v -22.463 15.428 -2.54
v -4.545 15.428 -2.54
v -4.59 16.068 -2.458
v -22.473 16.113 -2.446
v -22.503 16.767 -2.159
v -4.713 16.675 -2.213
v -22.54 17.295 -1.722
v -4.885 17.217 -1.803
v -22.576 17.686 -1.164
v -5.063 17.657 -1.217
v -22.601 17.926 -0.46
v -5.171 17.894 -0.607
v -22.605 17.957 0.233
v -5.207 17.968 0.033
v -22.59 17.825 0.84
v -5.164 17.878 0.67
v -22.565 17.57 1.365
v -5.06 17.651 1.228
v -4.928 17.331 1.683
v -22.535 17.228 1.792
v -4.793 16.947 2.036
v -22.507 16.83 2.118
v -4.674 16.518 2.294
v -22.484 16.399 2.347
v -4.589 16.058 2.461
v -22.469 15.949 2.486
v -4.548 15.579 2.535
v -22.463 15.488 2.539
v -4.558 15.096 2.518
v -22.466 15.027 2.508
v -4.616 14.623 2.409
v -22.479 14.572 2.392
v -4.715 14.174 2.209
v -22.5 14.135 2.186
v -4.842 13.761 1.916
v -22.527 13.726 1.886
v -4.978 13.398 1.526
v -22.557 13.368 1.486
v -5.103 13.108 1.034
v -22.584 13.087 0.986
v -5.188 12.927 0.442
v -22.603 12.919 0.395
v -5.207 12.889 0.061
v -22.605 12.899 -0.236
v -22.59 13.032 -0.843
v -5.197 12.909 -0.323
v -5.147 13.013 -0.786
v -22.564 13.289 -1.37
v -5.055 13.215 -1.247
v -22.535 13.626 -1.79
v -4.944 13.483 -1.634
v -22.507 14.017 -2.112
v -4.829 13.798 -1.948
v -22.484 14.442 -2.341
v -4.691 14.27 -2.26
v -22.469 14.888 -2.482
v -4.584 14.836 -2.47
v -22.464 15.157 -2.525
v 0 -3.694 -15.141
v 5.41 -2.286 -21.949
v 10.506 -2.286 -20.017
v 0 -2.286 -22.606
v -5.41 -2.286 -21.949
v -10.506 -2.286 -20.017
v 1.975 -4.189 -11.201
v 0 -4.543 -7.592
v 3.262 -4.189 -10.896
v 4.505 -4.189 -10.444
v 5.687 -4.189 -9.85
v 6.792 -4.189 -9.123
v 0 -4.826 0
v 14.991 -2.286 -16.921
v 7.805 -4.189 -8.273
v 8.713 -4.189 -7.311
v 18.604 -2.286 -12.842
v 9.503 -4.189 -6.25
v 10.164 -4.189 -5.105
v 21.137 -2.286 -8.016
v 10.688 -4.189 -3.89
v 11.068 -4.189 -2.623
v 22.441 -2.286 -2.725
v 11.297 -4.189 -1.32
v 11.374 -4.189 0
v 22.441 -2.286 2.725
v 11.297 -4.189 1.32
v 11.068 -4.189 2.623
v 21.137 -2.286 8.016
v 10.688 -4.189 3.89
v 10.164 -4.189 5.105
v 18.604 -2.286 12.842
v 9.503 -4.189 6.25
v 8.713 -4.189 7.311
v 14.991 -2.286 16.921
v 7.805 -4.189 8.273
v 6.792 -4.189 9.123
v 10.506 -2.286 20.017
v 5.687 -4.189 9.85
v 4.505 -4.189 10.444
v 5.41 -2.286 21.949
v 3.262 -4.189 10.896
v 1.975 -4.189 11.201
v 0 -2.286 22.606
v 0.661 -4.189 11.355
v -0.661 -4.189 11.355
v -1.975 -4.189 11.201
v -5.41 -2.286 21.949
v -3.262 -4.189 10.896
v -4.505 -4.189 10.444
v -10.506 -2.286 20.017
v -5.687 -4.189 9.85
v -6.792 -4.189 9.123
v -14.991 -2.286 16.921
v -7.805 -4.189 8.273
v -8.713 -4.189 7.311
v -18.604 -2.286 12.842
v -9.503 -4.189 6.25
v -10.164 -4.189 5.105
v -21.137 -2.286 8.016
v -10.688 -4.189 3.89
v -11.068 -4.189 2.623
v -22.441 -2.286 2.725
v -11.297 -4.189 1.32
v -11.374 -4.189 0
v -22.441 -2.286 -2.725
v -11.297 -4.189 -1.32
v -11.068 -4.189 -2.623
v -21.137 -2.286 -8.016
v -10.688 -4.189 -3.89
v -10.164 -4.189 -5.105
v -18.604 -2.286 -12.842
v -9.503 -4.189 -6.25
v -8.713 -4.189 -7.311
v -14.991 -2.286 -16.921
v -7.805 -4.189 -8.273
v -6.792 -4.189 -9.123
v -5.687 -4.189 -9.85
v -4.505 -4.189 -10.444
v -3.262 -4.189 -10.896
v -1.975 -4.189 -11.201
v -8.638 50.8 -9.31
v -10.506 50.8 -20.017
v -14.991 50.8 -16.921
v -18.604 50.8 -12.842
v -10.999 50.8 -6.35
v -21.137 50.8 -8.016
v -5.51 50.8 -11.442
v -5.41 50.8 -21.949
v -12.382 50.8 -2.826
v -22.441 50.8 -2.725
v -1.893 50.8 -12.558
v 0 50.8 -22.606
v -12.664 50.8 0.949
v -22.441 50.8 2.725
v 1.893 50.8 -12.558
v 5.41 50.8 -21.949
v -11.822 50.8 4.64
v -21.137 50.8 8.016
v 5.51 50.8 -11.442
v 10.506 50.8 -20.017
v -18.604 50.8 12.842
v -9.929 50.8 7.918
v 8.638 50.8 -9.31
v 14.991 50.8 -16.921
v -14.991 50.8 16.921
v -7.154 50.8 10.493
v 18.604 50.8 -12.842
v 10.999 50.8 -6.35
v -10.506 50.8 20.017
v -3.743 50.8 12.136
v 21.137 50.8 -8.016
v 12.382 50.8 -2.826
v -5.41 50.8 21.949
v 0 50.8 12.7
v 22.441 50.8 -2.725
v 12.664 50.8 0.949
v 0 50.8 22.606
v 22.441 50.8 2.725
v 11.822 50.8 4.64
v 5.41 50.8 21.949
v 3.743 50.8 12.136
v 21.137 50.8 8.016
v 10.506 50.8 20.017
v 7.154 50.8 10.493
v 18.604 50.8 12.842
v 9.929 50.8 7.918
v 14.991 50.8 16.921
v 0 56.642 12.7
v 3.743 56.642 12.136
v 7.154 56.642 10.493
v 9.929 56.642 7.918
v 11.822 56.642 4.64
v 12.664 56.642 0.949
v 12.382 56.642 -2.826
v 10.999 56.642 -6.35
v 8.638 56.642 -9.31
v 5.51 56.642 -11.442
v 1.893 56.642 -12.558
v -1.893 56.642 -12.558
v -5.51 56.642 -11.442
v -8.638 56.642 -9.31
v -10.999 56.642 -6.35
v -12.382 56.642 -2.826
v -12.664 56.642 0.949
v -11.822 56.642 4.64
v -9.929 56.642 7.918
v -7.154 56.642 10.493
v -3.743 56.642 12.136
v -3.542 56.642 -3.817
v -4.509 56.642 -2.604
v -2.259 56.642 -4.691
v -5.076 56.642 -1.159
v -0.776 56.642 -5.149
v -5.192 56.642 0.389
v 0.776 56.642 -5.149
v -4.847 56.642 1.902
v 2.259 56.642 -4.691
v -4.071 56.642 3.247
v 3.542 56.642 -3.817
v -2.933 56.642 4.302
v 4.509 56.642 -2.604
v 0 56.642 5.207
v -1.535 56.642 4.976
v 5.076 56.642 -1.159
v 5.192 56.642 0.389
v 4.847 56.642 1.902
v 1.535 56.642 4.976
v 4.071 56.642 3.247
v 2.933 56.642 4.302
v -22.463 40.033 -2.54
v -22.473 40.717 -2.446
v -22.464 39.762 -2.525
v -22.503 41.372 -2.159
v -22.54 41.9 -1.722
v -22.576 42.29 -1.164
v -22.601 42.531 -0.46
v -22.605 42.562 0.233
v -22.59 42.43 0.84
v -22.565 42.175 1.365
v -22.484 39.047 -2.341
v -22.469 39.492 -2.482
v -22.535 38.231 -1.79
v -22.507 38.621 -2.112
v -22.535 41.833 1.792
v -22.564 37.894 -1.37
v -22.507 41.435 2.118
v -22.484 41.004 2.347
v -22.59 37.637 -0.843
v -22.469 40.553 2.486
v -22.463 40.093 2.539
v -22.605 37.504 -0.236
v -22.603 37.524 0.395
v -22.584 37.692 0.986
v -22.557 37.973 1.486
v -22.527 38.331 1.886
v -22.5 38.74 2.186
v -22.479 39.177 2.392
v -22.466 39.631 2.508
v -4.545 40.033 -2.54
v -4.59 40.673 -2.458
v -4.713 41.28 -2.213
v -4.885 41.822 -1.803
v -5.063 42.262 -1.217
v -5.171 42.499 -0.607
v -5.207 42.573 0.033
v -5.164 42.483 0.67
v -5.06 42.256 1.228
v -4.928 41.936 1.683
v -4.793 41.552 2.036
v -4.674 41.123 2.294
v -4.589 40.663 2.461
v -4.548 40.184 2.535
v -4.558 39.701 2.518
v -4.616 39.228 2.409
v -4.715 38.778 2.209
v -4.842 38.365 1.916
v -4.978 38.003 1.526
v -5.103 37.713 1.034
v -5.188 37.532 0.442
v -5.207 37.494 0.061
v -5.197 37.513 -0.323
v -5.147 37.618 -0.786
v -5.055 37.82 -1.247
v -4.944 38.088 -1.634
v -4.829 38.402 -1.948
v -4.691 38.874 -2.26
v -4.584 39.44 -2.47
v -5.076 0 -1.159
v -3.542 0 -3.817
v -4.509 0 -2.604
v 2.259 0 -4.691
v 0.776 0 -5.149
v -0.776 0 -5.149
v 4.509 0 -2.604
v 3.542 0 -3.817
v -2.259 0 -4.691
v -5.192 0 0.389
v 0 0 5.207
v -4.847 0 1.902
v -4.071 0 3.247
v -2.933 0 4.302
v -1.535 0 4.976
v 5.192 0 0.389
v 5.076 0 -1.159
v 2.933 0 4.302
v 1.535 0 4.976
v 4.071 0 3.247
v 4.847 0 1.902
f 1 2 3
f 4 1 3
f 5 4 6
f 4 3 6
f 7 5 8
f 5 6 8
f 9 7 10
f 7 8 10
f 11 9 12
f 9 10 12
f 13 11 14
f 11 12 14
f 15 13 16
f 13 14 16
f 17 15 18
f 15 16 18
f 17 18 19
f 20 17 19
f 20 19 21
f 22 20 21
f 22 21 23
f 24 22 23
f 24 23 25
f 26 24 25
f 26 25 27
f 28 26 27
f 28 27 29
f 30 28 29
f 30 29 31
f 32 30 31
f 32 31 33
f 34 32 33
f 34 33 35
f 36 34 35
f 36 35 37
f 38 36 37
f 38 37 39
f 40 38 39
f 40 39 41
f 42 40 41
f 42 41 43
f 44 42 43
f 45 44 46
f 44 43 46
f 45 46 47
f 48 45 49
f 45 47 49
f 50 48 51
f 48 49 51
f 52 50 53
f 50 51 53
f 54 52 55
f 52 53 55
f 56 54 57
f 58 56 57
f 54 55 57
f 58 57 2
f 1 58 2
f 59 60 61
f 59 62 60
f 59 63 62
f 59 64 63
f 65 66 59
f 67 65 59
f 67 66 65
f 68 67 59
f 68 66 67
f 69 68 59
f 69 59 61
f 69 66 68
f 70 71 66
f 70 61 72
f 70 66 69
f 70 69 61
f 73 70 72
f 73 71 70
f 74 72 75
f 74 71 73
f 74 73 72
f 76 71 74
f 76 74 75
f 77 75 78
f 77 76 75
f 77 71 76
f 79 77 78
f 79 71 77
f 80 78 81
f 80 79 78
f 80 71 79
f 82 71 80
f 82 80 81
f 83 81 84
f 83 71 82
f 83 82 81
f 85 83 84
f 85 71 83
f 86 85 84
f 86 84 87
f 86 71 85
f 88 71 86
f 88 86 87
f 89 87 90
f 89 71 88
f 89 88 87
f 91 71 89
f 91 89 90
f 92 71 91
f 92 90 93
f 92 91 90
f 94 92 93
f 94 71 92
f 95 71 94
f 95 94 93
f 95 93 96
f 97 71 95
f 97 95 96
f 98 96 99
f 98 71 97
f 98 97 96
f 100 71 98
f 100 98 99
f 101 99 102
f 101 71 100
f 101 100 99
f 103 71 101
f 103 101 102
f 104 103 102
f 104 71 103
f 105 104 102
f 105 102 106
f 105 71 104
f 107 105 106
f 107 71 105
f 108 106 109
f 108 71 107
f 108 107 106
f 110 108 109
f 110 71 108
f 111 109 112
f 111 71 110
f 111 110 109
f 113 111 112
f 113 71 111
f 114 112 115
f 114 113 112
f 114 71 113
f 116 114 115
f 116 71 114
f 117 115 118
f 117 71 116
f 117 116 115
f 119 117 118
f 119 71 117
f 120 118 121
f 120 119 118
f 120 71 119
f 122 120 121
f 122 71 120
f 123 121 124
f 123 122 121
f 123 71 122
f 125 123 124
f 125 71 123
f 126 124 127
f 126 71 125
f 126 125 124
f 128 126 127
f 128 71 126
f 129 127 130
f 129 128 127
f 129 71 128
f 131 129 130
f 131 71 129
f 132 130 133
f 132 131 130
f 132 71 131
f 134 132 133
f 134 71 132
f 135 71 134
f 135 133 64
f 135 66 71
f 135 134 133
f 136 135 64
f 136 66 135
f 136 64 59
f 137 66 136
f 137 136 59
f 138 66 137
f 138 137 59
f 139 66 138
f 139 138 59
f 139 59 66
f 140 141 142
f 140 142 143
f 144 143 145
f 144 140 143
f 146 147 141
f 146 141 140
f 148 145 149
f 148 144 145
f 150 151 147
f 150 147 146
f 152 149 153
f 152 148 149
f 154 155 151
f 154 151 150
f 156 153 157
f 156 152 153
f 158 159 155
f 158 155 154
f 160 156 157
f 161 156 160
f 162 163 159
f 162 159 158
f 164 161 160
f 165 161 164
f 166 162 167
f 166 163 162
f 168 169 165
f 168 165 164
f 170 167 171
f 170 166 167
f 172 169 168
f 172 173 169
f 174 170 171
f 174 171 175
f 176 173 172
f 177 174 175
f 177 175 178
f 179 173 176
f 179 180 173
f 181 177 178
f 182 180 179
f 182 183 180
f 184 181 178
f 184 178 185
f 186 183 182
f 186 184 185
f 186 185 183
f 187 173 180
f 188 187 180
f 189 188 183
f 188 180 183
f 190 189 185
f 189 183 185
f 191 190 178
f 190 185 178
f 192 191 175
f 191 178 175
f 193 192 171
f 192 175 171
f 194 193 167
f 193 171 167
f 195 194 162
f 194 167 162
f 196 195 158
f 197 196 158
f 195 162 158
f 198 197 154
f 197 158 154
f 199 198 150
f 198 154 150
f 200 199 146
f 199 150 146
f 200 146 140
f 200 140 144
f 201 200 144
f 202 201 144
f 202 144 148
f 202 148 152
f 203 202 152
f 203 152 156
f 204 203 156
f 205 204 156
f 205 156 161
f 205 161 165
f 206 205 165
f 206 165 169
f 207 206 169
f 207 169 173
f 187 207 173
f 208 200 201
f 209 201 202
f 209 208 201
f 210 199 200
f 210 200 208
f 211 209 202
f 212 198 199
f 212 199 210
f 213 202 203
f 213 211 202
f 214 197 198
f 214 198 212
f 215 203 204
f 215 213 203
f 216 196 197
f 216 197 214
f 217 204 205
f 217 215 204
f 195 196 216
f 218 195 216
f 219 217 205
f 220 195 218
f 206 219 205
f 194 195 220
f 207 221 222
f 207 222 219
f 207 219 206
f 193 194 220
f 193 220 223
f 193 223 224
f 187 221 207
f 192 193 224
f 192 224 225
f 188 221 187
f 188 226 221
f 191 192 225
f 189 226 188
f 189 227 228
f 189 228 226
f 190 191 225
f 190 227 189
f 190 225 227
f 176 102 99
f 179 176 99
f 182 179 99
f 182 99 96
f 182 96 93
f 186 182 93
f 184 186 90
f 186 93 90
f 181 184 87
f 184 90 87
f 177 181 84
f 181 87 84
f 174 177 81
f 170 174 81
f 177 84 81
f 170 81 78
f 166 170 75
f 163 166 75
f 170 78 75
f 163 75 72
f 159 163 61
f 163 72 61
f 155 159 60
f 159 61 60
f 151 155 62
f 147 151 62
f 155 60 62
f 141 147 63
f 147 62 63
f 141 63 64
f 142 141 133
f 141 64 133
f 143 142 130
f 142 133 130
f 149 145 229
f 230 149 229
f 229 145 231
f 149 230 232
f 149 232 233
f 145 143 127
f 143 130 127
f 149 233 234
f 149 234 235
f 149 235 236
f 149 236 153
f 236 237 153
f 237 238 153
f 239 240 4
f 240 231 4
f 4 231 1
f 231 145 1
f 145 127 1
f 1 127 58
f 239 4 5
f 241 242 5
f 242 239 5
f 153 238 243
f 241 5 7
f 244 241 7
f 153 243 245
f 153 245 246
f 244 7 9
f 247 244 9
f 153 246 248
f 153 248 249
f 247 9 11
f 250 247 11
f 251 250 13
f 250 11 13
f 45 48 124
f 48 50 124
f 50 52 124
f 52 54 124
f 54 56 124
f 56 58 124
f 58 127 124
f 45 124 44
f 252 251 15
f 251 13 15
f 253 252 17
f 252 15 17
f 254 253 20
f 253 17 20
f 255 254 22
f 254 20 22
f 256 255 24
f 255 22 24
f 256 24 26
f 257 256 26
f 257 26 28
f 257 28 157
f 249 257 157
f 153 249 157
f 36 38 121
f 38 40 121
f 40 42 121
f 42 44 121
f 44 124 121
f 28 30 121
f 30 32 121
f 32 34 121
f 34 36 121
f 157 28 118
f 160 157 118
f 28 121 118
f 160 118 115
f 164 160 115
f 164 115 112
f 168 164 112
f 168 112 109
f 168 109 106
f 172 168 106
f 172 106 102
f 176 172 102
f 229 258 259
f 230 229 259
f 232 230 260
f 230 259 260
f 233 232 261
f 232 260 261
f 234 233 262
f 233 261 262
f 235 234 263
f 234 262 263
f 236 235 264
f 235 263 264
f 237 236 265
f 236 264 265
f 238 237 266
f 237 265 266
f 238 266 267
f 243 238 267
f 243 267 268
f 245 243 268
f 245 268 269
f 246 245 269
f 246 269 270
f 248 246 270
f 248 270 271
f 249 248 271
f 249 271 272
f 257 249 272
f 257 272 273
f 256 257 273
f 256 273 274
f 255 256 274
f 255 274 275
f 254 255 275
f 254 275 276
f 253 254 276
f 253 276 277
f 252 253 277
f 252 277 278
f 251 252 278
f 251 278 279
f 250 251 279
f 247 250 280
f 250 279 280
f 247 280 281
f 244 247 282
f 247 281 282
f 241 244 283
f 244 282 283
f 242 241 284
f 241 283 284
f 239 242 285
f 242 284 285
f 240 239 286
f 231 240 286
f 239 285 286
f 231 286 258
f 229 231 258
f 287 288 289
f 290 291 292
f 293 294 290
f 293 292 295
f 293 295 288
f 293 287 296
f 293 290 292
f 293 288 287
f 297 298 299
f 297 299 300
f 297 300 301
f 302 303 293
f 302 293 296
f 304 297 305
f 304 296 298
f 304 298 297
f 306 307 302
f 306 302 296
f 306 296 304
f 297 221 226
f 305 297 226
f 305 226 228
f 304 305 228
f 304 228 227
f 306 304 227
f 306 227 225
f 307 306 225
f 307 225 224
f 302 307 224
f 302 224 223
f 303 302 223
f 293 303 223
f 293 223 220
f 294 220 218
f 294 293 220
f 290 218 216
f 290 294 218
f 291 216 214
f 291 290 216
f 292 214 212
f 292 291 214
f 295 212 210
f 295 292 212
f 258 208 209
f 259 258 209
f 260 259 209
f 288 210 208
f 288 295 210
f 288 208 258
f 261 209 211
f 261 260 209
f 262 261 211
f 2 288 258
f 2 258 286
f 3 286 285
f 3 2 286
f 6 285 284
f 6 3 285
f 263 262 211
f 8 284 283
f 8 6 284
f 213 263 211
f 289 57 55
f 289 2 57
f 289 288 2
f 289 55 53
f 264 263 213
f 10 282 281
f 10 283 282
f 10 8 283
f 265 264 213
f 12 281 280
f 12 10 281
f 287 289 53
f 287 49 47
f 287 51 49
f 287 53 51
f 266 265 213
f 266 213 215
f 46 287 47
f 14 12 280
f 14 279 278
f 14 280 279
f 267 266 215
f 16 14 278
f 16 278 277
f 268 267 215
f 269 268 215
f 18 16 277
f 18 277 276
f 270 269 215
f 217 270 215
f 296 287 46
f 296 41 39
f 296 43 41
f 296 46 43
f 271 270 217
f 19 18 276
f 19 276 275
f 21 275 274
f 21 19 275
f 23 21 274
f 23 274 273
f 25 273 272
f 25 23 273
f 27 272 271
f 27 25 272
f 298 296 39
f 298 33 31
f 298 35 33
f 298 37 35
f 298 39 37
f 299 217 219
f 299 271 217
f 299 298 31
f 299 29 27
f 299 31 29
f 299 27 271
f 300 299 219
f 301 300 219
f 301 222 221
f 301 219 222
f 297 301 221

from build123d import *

# Parameters (mm, degrees)
CROQUIS1_R              = 22.606
SALIENTE_EXTRUIR1_DEPTH = 50.8
CROQUIS2_R              = 12.7
SALIENTE_EXTRUIR2_DEPTH = 56.642
CROQUIS3_R              = 2.54
CORTAR_EXTRUIR1_DEPTH   = 31.242
CROQUIS4_R              = 5.207
CORTAR_EXTRUIR4_DEPTH   = 144.018
SALIENTE_EXTRUIR3_START = -2.286
CROQUIS5_R              = 22.606
SALIENTE_EXTRUIR3_DEPTH = 2.286
C_PULA1_FACE_RADIUS     = 22.606
C_PULA1_HEIGHT          = 2.54


with BuildPart() as part:
    # Croquis1 → Saliente-Extruir1 (new body)
    with BuildSketch(Plane(origin=(0, 0, 0), x_dir=(1, 0, 0), z_dir=(0, 1, 0))):
        with Locations(Location((0, 0, 0), (0, 0, 270))):
            Circle(CROQUIS1_R)
    extrude(amount=SALIENTE_EXTRUIR1_DEPTH)

    # Croquis2 → Saliente-Extruir2 (add)
    with BuildSketch(Plane(origin=(0, 0, 0), x_dir=(1, 0, 0), z_dir=(0, 1, 0))):
        with Locations(Location((0, 0, 0), (0, 0, 270))):
            Circle(CROQUIS2_R)
    extrude(amount=SALIENTE_EXTRUIR2_DEPTH)

    # Croquis3 → Cortar-Extruir1 (cut)
    with BuildSketch(Plane(origin=(0, 0, 0), x_dir=(0, 0, -1), z_dir=(1, 0, 0))):
        with Locations((0, 40.032848535)):
            Circle(CROQUIS3_R)
        with Locations((0, 15.428124721)):
            Circle(CROQUIS3_R)
    extrude(amount=-CORTAR_EXTRUIR1_DEPTH, mode=Mode.SUBTRACT)

    # Croquis4 → Cortar-Extruir4 (cut)
    with BuildSketch(Plane(origin=(0, 0, 0), x_dir=(1, 0, 0), z_dir=(0, 1, 0))):
        with Locations(Location((0, 0, 0), (0, 0, 270))):
            Circle(CROQUIS4_R)
    extrude(amount=CORTAR_EXTRUIR4_DEPTH, mode=Mode.SUBTRACT)

    # Croquis5 → Saliente-Extruir3 (add)
    with BuildSketch(Plane(origin=(0, 0, 0), x_dir=(1, 0, 0), z_dir=(0, 1, 0)).offset(SALIENTE_EXTRUIR3_START)):
        with Locations(Location((0, 0, 0), (0, 0, 270))):
            Circle(CROQUIS5_R)
    extrude(amount=SALIENTE_EXTRUIR3_DEPTH)

    # Cúpula1: a dome of height H over a round flat face of radius A is a cap of a sphere of radius (A * A + H * H) / (2 * H)
    c_pula1_r = (C_PULA1_FACE_RADIUS * C_PULA1_FACE_RADIUS + C_PULA1_HEIGHT * C_PULA1_HEIGHT) / (2 * C_PULA1_HEIGHT)
    c_pula1_base = Plane((0, -2.286, 0), z_dir=(0, -1, 0))
    with Locations(c_pula1_base.offset(C_PULA1_HEIGHT - c_pula1_r)):
        c_pula1_ball = Sphere(c_pula1_r, mode=Mode.PRIVATE)
    add(split(c_pula1_ball, bisect_by=c_pula1_base, keep=Keep.TOP, mode=Mode.PRIVATE))


solid = part.part
